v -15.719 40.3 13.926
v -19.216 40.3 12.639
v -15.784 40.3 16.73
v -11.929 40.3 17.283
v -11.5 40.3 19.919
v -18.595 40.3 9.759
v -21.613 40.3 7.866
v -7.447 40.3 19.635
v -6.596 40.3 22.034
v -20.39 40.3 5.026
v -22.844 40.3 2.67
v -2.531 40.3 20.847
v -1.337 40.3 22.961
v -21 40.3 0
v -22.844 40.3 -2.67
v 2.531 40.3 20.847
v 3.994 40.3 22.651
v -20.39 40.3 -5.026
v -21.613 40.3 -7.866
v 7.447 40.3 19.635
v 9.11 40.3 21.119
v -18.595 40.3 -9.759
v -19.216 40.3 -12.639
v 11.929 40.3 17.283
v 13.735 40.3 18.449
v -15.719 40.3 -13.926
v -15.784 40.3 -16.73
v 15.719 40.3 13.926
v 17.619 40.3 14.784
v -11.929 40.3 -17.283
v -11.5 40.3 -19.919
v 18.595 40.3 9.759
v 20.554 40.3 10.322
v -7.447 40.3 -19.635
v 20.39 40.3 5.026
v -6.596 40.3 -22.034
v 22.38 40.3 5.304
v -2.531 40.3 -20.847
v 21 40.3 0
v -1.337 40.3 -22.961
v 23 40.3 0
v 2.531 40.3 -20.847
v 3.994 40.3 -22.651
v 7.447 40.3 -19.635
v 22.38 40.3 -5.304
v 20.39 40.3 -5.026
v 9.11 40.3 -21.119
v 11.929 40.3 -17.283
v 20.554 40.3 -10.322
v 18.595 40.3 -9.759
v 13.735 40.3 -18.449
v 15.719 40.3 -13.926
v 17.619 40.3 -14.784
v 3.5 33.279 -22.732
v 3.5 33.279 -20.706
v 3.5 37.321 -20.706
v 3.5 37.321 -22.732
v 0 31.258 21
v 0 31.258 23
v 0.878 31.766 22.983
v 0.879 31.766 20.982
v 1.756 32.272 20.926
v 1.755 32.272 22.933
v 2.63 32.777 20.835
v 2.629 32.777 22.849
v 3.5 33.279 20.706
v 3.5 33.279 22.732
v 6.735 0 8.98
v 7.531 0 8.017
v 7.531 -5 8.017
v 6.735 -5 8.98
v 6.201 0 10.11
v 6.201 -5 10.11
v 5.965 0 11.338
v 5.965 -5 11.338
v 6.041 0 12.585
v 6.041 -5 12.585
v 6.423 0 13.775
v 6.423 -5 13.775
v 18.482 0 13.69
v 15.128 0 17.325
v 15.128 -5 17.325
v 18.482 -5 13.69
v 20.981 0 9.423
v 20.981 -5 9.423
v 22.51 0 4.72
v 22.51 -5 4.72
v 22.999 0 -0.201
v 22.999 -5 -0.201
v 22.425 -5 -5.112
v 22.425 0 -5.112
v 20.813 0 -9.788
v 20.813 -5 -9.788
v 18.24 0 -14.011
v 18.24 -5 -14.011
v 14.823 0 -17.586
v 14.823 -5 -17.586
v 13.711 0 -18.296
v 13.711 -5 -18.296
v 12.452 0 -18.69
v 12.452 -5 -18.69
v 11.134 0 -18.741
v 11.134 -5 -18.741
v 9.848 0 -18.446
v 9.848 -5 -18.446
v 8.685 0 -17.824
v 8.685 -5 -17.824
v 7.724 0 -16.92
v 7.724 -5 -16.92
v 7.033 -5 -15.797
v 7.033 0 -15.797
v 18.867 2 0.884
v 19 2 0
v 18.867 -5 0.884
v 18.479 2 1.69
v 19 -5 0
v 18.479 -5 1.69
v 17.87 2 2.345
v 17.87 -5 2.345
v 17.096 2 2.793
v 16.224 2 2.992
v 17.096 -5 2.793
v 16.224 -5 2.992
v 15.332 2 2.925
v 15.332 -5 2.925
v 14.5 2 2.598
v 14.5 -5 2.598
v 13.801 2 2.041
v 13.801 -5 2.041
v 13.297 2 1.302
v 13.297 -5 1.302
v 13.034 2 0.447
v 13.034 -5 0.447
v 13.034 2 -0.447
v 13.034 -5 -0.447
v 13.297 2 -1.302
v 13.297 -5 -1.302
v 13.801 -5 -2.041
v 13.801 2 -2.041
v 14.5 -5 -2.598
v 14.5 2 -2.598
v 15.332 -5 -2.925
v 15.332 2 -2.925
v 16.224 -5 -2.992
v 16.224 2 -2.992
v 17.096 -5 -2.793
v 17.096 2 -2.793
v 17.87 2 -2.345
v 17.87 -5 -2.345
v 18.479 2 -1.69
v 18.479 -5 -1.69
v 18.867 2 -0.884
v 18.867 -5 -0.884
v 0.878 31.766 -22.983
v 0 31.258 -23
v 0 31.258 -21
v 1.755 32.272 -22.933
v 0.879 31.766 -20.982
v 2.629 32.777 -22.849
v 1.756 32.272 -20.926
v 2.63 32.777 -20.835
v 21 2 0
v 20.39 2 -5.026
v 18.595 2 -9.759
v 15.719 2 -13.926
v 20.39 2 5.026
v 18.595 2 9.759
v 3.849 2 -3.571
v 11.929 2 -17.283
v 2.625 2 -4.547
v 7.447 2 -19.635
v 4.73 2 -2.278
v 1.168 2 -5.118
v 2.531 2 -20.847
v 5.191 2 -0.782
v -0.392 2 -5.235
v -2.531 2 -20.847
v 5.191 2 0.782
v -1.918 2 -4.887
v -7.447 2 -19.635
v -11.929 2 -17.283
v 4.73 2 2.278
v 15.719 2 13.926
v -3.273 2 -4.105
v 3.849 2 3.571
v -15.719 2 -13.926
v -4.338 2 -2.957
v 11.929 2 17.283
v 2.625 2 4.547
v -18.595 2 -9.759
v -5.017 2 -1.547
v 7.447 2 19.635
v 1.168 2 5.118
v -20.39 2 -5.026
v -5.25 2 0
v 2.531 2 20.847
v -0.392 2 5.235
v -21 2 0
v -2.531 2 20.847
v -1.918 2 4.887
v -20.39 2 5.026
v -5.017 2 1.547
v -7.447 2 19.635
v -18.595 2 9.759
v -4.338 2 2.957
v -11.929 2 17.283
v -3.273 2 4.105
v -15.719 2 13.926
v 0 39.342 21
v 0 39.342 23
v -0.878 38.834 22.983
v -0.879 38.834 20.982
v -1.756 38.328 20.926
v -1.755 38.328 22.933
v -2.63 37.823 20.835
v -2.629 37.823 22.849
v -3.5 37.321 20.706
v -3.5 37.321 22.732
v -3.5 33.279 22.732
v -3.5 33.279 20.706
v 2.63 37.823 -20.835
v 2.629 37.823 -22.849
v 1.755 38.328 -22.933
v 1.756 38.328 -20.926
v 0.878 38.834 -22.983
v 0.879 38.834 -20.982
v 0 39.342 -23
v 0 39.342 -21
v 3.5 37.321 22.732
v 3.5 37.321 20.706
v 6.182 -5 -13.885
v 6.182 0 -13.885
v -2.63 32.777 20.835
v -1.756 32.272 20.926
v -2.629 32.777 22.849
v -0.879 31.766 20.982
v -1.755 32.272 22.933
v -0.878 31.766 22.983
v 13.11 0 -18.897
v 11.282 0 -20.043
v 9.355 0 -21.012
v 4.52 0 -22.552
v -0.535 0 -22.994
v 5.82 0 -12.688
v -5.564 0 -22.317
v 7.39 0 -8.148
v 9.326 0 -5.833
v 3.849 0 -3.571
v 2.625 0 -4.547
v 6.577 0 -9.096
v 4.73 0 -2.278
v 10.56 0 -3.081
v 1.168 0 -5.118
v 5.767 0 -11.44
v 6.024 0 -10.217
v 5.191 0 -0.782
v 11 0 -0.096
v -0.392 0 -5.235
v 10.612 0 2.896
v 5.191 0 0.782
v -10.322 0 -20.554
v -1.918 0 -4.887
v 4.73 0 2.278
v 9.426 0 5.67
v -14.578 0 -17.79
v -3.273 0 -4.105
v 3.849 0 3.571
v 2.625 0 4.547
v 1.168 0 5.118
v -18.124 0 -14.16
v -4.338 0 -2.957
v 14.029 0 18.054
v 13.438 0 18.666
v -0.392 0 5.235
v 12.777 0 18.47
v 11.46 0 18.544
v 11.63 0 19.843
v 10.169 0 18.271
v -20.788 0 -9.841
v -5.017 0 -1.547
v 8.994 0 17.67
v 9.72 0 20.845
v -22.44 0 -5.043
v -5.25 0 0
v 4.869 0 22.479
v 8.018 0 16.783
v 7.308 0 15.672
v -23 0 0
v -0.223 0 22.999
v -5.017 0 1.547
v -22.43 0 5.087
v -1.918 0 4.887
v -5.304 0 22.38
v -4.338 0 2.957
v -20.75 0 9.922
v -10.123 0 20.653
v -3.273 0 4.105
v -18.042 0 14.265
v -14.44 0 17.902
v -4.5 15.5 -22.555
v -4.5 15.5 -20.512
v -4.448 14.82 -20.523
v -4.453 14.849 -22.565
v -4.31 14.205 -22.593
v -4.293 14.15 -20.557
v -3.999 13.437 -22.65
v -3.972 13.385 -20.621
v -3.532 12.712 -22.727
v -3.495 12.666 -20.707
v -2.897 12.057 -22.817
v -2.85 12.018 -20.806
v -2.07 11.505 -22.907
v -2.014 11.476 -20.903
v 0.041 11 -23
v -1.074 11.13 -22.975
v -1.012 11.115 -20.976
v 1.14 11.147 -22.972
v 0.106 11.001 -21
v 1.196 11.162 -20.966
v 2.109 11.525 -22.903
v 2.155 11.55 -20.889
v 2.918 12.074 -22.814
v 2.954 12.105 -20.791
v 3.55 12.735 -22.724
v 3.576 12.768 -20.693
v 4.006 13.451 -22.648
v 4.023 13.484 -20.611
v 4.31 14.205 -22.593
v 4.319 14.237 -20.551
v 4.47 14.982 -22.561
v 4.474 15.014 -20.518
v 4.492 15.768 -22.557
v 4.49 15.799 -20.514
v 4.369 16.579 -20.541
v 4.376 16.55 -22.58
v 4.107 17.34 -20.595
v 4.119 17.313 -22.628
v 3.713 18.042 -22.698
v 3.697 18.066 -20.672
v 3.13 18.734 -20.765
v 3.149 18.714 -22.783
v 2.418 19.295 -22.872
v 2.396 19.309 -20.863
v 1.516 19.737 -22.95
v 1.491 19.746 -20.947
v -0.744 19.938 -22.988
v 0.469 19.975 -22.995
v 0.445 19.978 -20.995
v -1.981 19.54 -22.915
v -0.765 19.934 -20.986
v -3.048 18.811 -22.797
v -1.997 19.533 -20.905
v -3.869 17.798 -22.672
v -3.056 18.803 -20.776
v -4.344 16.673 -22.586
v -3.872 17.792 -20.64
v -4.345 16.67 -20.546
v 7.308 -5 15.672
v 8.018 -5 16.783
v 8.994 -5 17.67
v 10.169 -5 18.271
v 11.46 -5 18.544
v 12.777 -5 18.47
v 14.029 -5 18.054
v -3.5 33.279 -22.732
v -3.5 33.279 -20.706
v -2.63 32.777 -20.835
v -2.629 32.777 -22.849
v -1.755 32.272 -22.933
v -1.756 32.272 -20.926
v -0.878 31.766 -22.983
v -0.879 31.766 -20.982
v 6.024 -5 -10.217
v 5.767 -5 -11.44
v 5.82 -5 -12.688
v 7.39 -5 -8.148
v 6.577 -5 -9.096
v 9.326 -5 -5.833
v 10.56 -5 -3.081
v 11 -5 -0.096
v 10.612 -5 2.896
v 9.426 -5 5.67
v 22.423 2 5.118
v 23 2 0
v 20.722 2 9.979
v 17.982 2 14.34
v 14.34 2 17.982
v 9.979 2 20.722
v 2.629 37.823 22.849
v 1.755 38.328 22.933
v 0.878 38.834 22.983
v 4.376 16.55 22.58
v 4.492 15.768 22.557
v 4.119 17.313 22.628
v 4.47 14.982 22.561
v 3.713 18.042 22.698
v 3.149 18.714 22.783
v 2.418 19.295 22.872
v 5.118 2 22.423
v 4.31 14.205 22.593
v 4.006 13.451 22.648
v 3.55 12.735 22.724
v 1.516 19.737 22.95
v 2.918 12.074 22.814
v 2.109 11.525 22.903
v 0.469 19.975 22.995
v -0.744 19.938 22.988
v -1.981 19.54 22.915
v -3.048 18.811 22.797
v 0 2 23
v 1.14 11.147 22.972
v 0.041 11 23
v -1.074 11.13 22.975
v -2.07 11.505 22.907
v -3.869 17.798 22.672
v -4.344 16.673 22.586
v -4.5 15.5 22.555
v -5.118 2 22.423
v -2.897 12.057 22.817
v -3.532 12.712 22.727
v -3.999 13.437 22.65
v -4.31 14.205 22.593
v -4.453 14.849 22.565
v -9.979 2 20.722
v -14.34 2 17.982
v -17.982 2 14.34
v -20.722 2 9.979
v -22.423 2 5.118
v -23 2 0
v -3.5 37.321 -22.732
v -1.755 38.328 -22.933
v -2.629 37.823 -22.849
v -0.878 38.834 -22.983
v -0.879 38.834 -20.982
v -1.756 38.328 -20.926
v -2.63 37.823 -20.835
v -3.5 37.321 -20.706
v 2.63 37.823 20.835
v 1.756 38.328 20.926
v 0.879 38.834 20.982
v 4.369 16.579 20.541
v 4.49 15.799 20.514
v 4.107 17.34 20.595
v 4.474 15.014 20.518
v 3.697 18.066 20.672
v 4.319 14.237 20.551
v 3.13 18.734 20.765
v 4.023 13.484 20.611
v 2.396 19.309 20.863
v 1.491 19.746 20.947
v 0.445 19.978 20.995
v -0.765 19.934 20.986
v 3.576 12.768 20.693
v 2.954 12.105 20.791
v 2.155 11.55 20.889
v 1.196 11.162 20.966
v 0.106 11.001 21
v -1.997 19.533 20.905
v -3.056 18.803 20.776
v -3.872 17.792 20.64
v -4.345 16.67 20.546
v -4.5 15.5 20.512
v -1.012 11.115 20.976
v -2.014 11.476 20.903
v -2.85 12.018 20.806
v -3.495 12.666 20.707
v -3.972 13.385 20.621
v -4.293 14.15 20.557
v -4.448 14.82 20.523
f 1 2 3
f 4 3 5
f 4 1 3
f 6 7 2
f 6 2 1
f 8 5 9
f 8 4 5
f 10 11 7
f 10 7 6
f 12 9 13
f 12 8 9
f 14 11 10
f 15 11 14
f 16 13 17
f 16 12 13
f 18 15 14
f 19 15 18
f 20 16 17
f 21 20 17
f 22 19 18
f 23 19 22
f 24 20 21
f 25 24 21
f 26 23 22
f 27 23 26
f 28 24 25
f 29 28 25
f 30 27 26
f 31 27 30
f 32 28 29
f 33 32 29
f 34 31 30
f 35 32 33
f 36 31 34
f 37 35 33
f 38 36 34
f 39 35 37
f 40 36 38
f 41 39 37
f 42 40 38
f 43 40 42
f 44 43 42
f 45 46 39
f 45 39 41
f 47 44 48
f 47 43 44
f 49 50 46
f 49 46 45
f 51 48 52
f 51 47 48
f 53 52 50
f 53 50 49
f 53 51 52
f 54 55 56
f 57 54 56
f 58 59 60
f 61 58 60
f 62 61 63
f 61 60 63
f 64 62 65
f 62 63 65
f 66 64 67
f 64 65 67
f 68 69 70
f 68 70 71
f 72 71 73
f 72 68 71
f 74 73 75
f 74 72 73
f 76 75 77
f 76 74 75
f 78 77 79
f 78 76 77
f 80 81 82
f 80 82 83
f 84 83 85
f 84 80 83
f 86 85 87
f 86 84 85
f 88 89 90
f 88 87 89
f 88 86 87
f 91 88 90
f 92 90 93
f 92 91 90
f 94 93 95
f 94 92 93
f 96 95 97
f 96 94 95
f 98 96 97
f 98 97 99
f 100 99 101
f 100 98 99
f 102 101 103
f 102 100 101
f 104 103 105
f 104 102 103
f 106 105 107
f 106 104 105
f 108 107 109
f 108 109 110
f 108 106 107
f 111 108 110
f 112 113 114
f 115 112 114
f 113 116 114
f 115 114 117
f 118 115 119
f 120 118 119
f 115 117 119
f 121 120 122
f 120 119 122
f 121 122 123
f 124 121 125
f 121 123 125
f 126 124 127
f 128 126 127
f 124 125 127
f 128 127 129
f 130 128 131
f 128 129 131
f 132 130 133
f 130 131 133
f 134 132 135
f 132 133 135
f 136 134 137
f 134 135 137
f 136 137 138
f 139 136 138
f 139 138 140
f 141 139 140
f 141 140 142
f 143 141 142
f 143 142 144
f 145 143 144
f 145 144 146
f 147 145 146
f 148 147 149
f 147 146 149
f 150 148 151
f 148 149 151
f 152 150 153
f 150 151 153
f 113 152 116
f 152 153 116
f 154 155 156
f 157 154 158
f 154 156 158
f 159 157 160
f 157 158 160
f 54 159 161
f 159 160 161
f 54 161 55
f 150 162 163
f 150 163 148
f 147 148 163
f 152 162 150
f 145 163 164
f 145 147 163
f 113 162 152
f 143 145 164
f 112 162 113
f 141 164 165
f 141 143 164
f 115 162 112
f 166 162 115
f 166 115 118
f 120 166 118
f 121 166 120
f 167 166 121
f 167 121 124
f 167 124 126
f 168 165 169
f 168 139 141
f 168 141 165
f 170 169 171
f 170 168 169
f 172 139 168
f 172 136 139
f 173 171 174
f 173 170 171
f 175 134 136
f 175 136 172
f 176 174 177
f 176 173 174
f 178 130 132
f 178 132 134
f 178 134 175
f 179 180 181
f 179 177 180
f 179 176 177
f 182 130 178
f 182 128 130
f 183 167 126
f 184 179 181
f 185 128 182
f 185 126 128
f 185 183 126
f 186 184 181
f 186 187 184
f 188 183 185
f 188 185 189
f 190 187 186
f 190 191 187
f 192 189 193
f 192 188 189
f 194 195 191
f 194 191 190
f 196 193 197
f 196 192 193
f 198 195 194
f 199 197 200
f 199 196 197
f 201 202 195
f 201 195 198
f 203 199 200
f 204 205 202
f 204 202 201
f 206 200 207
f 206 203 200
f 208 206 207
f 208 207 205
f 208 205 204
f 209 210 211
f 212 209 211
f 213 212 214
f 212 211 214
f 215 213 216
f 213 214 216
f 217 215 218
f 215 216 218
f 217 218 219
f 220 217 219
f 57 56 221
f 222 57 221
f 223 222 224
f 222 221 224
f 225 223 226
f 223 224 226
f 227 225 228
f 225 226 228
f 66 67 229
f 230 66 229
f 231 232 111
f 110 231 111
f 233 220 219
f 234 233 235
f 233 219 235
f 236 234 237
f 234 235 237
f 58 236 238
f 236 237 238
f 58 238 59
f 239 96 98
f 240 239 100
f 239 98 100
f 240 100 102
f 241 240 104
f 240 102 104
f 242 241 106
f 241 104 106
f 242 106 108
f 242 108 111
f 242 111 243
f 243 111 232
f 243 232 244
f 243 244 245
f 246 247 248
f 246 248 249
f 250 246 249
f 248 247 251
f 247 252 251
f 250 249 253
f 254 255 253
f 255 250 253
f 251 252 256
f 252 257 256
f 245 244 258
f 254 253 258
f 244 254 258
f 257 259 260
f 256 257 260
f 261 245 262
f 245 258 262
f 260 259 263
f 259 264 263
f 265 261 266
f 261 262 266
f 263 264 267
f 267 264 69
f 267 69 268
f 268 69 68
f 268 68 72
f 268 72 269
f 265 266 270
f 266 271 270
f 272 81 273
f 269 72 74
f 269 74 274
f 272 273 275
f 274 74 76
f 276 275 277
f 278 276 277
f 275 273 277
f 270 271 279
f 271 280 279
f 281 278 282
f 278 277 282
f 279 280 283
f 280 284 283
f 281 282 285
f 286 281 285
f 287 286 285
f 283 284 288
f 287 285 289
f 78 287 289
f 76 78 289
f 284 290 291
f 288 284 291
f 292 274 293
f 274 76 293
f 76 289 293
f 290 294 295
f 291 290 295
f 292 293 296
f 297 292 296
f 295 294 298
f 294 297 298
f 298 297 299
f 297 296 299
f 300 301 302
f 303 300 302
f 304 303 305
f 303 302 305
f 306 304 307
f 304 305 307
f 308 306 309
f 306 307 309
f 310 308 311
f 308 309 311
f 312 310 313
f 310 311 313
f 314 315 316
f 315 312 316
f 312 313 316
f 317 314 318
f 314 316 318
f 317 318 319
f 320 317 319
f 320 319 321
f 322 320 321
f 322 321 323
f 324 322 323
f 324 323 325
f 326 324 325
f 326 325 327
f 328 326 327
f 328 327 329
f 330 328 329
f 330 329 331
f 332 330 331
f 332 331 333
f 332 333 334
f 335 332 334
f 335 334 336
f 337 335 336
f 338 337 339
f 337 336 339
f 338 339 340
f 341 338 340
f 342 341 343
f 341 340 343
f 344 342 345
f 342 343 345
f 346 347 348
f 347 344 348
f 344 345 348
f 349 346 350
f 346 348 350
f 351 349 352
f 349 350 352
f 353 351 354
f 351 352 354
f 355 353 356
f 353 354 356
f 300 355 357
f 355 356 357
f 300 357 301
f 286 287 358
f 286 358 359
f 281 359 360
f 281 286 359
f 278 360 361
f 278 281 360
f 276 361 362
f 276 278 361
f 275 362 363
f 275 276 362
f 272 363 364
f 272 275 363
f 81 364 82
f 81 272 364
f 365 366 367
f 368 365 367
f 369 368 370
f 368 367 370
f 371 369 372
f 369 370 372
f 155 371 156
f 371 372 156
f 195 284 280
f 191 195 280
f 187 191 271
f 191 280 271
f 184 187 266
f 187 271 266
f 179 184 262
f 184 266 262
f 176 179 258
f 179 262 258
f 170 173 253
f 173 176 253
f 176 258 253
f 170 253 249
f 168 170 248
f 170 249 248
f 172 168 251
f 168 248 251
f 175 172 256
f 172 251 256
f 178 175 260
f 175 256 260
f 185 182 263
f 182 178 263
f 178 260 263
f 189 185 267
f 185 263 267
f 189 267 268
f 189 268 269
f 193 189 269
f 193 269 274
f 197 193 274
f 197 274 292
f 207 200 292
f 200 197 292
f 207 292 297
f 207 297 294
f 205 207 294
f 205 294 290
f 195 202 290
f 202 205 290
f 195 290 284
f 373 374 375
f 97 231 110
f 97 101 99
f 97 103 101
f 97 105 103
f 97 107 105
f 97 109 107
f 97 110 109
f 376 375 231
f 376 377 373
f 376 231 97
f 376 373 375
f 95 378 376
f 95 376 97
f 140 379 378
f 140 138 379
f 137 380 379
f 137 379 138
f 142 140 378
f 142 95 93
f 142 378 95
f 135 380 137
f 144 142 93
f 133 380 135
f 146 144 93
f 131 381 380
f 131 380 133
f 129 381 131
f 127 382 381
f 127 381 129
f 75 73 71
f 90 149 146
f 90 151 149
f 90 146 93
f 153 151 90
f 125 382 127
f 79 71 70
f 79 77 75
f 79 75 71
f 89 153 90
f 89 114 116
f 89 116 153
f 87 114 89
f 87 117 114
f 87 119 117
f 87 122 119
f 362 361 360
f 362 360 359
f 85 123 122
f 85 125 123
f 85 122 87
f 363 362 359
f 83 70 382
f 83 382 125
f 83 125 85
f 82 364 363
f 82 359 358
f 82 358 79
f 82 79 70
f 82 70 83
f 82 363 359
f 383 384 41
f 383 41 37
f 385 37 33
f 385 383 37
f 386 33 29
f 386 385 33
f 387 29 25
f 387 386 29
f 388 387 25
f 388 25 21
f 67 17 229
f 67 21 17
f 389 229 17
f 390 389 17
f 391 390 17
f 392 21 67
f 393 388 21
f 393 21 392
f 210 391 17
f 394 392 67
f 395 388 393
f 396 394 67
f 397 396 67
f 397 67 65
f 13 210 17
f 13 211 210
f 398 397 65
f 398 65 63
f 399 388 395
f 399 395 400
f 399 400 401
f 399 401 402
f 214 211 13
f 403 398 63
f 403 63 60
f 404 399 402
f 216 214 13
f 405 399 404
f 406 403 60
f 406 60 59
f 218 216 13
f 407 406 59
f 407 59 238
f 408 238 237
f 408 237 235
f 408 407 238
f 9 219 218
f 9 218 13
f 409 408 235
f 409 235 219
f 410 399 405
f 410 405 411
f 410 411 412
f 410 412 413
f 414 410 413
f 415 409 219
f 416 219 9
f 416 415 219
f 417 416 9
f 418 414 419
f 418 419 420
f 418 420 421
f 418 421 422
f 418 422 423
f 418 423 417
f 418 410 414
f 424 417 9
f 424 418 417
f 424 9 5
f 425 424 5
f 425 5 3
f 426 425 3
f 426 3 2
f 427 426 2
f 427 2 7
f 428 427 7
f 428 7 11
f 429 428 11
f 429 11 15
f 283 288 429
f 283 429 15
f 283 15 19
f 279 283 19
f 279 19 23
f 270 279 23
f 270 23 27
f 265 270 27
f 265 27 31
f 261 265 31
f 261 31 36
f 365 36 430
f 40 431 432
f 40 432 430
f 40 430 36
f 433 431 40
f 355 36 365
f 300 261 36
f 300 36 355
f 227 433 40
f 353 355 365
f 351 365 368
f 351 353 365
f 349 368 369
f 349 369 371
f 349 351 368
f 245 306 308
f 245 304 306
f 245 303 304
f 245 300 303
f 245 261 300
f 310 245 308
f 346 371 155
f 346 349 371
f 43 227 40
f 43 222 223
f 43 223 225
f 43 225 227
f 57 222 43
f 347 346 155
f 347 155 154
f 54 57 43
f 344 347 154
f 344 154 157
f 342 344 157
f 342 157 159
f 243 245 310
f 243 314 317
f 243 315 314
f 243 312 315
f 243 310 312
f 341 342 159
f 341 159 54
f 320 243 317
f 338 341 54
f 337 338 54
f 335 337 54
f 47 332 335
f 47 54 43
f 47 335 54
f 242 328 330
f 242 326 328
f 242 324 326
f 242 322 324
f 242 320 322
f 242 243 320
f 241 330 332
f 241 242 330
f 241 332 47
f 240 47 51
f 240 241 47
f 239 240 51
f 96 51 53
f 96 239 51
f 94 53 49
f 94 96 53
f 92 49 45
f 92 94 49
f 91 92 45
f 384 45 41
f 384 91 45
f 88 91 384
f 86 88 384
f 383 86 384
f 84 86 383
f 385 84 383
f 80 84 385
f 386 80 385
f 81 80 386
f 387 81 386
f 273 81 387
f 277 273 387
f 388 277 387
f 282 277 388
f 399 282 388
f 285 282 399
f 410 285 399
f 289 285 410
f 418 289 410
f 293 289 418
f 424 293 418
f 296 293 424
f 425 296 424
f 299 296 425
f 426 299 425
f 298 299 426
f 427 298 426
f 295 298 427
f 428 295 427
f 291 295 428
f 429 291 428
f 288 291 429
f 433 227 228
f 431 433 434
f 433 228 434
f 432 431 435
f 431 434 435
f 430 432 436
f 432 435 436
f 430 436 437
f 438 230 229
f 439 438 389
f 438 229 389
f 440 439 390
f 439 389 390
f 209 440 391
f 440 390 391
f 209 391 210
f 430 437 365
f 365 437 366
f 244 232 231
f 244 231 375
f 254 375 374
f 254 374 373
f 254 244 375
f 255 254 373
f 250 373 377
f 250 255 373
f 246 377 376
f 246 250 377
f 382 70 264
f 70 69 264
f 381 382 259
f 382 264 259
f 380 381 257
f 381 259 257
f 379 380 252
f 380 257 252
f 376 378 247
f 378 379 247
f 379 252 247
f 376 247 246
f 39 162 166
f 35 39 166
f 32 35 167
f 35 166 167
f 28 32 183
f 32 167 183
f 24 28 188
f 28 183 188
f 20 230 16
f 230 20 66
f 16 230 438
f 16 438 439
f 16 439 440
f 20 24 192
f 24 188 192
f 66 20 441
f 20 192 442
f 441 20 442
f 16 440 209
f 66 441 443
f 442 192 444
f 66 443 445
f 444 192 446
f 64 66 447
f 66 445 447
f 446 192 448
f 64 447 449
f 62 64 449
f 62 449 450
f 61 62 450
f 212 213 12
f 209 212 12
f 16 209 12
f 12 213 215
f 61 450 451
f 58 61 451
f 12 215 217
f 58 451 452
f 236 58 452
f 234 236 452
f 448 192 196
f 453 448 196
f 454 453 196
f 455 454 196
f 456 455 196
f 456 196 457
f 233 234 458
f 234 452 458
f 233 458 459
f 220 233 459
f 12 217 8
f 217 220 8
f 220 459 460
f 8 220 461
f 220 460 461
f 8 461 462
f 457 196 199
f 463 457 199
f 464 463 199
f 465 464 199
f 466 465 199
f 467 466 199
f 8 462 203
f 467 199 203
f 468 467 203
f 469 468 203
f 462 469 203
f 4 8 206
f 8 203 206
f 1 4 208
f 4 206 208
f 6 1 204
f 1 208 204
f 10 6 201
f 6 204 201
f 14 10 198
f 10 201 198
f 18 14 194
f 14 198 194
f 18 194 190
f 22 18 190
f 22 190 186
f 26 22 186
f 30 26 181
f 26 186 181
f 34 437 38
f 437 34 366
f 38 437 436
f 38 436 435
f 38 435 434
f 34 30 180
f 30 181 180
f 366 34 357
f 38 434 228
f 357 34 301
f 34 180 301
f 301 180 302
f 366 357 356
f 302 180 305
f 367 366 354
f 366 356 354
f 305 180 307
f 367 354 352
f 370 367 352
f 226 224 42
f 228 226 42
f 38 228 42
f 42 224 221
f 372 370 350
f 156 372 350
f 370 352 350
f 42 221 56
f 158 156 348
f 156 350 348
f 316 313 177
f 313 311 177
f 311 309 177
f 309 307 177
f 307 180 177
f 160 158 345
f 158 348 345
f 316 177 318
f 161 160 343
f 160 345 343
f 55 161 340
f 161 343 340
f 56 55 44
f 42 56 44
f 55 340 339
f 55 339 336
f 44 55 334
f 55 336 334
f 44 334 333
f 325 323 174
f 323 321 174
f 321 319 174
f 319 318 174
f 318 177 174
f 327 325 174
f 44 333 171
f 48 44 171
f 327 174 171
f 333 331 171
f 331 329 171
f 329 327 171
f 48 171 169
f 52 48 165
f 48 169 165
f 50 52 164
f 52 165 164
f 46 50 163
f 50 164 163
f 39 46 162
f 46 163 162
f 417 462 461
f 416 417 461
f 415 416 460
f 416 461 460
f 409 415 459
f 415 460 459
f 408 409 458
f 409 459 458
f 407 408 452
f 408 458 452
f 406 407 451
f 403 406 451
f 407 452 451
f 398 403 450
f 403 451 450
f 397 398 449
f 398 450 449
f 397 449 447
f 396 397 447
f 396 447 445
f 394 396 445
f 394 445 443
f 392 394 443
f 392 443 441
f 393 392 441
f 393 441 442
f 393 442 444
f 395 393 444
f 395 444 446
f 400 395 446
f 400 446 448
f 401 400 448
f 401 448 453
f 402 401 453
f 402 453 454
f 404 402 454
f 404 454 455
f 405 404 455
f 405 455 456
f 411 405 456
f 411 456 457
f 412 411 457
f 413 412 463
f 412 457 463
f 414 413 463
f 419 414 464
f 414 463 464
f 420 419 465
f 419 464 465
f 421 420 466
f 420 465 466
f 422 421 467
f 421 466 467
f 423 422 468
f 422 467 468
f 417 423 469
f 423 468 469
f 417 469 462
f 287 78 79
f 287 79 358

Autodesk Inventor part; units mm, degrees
ref_plane "YZ Plane" through (0, 0, 0) normal (1, 0, 0) x (0, 1, 0)
ref_plane "XZ Plane" through (0, 0, 0) normal (0, 1, 0) x (-1, 0, 0)
ref_plane "XY Plane" through (0, 0, 0) normal (0, 0, 1) x (1, 0, 0)
sketch "Sketch1" plane through (0, 0, 0) normal (0, 1, 0) x (-1, 0, 0)
  circle A0 centre (0, 0) radius 23
  circle A1 centre (0, 0) radius 5.25
  dimension "d0" = 46
  dimension "d3" = 10.5
extrude "Extrusion1" add sketch "Sketch1" along normal blind 2
sketch "Sketch2" plane through (0, 2, 0) normal (0, 1, 0) x (1, 0, 0)
  circle A0 centre (0, 0) radius 21
  circle A1 centre (0, 0) radius 23 projected
  line L0 (0, -23) -> (0, -21)
  line L1 (0, 21) -> (0, 23)
  dimension "d4" = 42
extrude "Extrusion2" add sketch "Sketch2" along normal blind 38.3 contours A0 L1 A1 L0 | A0 L0 A1 L1
sketch "Sketch4" plane through (0, 0, 0) normal (0, -1, 0) x (1, 0, 0)
  circle A0 centre (0, 0) radius 5.25 projected
  arc A1 (6.9145, -15.5303) -> (7.1845, 15.4072) centre (0, 0) ccw construction
  arc A2 (9.3549, -21.0115) -> (9.7202, 20.8451) centre (0, 0) ccw
  arc A3 (4.4741, -10.049) -> (4.6488, 9.9694) centre (0, 0) ccw
  arc A4 (4.4741, -10.049) -> (9.3549, -21.0115) centre (6.9145, -15.5303) ccw
  arc A5 (9.7202, 20.8451) -> (4.6488, 9.9694) centre (7.1845, 15.4072) ccw
  line L0 (0, 0) -> (7.1845, 15.4072) construction
  line L1 (0, 0) -> (17, 0) construction
  line L2 (0, 0) -> (6.9145, -15.5303) construction
  line L3 (4.4741, -10.049) -> (9.3549, -21.0115)
  line L4 (4.6488, 9.9694) -> (9.7202, 20.8451)
  line L5 (6.9145, -15.5303) -> (10.1416, -13.6436) construction
  line L6 (0, 0) -> (3.2528, 0) construction
  line L7 (0, 0) -> (2, 0) construction
  dimension "d13" = 17
  dimension "d14" = 65
  dimension "d15" = 131
  dimension "d16" = 12
extrude "Extrusion4" add sketch "Sketch4" along normal blind 5 contours L3 A3 L4 A2
fillet "Fillet1" radius 5 4 edges at (4.4741, -2.5, -10.049) (9.3549, -2.5, -21.0115) (4.6488, -2.5, 9.9694) (9.7202, -2.5, 20.8451)
sketch "Sketch7" plane through (0, -5, 0) normal (0, -1, 0) x (1, 0, 0)
  arc A0 (14.8233, -17.586) -> (15.128, 17.3247) centre (0, 0) ccw projected
  line L0 (23, 0) -> (16, 0)
  circle A1 centre (16, 0) radius 3
  dimension "d35" = 7
  dimension "d36" = 6
extrude "Extrusion7" cut sketch "Sketch7" against normal blind 10
sketch "Sketch8" plane through (0, -5, 0) normal (0, -1, 0) x (1, 0, 0)
  circle A0 centre (0, 0) radius 23 construction
  line L0 (23, 0) -> (0, 0) construction
  line L1 (0, 0) -> (0, -23) construction
sketch "Sketch9" plane through (0, 0, 0) normal (0, 0, 1) x (1, 0, 0)
  line L0 (0, 0) -> (0, 40.3) construction
  line L1 (-21, 40.3) -> (21, 40.3) construction
ref_plane "Work Plane2" through (0, 40.3, 0) normal (0, 0, -1) x (-1, 0, 0)
sketch "Sketch10" plane through (0, 40.3, 0) normal (0, 0, -1) x (-1, 0, 0)
  line L0 (-13.6647, -16.0448) -> (0, 0) construction
  line L1 (-21, 0) -> (21, 0) construction
  line L2 (0, 0) -> (0, -24.8) construction
  circle A0 centre (0, -24.8) radius 4.5
  point P0 (0, -40.3)
  dimension "d39" = 24.8
  dimension "d41" = 9
extrude "Extrusion8" cut sketch "Sketch10" along normal mid plane 66.25
sketch "Sketch11" plane through (0, 40.3, 0) normal (0, 0, -1) x (-1, 0, 0)
  line L0 (0.1725, 0) -> (0.1725, -5.1914) construction
  line L1 (-3.5, -7.0207) -> (-3.5, -2.9793)
  line L2 (-3.5, -2.9793) -> (0, -0.9585)
  line L3 (0, -0.9585) -> (3.5, -2.9793)
  line L4 (3.5, -2.9793) -> (3.5, -7.0207)
  line L5 (3.5, -7.0207) -> (0, -9.0415)
  line L6 (0, -9.0415) -> (-3.5, -7.0207)
  point P0 (0, -40.3)
  point P1 (0, -5)
extrude "Extrusion9" cut sketch "Sketch11" along normal mid plane 66.25
properties part number "BasePotentiometer_3DPrint"
